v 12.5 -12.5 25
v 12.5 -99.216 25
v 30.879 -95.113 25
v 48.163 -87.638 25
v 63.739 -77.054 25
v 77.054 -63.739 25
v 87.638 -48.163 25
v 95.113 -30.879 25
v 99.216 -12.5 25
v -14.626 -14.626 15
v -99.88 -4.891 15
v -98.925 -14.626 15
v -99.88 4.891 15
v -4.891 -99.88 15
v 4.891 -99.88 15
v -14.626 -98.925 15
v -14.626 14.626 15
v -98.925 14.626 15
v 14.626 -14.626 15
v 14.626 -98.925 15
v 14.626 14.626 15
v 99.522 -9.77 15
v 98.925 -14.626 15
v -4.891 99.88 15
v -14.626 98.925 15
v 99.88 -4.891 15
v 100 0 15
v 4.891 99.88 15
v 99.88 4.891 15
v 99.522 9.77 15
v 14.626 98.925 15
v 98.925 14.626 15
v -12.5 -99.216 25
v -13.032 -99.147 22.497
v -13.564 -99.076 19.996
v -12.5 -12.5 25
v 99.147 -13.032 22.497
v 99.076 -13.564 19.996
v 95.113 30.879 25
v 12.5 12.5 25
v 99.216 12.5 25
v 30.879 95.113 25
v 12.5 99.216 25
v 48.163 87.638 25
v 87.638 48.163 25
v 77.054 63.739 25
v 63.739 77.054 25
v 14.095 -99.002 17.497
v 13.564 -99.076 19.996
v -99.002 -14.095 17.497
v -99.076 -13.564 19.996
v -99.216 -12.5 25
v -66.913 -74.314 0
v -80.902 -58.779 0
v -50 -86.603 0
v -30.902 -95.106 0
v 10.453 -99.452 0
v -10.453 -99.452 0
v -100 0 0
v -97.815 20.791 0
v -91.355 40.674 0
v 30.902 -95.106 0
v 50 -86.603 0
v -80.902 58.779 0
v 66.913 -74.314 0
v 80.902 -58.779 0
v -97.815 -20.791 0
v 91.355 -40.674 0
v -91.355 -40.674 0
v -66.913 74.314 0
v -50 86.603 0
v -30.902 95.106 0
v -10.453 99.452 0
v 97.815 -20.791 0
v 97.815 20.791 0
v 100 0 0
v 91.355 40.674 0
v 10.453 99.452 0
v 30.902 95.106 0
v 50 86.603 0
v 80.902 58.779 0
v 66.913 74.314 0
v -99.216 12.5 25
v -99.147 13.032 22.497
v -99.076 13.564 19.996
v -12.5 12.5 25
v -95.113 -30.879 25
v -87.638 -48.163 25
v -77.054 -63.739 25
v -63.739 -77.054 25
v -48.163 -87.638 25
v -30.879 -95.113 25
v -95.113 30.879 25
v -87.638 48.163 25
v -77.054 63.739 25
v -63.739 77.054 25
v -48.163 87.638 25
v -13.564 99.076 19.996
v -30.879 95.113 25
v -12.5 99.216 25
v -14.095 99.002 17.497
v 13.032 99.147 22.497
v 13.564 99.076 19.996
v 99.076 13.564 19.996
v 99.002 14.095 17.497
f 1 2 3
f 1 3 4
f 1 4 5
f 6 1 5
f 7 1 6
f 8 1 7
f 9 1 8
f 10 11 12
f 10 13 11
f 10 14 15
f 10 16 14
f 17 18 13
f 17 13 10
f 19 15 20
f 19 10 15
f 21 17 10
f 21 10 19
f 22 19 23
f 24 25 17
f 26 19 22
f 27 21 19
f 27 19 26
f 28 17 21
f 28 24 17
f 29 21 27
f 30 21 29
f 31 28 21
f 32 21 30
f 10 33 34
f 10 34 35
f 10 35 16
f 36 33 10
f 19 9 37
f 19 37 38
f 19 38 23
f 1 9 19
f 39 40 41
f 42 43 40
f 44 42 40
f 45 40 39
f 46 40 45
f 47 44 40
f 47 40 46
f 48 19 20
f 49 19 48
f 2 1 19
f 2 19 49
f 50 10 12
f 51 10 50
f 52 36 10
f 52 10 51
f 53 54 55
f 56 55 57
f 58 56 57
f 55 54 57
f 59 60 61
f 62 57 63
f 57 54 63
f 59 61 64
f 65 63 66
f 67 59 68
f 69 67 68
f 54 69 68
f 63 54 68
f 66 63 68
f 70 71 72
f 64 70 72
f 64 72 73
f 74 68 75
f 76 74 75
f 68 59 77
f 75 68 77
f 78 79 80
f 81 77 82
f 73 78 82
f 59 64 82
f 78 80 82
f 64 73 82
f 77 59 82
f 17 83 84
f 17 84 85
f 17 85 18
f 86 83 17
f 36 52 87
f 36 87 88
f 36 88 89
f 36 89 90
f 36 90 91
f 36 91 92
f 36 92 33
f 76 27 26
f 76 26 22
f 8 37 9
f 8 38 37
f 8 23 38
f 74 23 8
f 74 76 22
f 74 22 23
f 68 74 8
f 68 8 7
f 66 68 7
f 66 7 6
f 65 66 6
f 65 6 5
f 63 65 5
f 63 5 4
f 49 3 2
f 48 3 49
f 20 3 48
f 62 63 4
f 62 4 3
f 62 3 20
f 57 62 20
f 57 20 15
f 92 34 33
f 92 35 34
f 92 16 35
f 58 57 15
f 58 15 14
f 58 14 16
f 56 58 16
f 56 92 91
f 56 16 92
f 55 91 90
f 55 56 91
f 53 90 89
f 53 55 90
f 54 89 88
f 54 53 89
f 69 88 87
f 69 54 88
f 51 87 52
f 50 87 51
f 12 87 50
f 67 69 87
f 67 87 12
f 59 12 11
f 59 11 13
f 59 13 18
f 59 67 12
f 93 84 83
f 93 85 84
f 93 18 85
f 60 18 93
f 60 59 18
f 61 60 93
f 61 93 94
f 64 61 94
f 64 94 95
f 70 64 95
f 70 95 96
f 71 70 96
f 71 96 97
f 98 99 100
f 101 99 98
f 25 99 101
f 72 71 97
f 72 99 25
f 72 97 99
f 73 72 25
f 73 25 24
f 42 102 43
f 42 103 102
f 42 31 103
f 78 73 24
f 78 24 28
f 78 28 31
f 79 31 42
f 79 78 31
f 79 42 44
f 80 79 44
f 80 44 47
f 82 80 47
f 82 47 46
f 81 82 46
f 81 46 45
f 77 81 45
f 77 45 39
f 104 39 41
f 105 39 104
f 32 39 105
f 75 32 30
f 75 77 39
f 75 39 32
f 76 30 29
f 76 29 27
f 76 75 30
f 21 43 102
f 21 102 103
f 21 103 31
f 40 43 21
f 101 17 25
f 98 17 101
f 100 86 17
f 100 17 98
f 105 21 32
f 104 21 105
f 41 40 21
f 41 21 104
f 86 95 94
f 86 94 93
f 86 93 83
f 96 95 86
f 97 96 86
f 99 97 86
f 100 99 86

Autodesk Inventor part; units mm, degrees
ref_plane "YZ Plane" through (0, 0, 0) normal (1, 0, 0) x (0, 1, 0)
ref_plane "XZ Plane" through (0, 0, 0) normal (0, 1, 0) x (-1, 0, 0)
ref_plane "XY Plane" through (0, 0, 0) normal (0, 0, 1) x (1, 0, 0)
sketch "Sketch1" plane through (0, 0, 0) normal (0, 0, 1) x (1, 0, 0)
  circle A0 centre (0, 0) radius 100
  dimension "Dia" = 200
extrude "Extrusion1" add sketch "Sketch1" along normal blind 25
sketch "Sketch2" plane through (0, 0, 25) normal (0, 0, 1) x (1, 0, 0)
  line L0 (-100, 12.5) -> (100, 12.5)
  line L1 (100, 12.5) -> (100, -12.5)
  line L2 (100, -12.5) -> (-100, -12.5)
  line L3 (-100, -12.5) -> (-100, 12.5)
  line L4 (-100, 12.5) -> (100, -12.5) construction
  line L5 (100, 12.5) -> (-100, -12.5) construction
  point P0 (0, 0)
  dimension "d3" = 200
  dimension "d4" = 25
extrude "Extrusion2" cut sketch "Sketch2" against normal blind 10 draft 12
pattern_circular "Circular Pattern1" count 2 over 90 about axis through (0, 0, 0) along (0, 0, 1) of "Extrusion2"
equation "\"d3\" = Dia"
